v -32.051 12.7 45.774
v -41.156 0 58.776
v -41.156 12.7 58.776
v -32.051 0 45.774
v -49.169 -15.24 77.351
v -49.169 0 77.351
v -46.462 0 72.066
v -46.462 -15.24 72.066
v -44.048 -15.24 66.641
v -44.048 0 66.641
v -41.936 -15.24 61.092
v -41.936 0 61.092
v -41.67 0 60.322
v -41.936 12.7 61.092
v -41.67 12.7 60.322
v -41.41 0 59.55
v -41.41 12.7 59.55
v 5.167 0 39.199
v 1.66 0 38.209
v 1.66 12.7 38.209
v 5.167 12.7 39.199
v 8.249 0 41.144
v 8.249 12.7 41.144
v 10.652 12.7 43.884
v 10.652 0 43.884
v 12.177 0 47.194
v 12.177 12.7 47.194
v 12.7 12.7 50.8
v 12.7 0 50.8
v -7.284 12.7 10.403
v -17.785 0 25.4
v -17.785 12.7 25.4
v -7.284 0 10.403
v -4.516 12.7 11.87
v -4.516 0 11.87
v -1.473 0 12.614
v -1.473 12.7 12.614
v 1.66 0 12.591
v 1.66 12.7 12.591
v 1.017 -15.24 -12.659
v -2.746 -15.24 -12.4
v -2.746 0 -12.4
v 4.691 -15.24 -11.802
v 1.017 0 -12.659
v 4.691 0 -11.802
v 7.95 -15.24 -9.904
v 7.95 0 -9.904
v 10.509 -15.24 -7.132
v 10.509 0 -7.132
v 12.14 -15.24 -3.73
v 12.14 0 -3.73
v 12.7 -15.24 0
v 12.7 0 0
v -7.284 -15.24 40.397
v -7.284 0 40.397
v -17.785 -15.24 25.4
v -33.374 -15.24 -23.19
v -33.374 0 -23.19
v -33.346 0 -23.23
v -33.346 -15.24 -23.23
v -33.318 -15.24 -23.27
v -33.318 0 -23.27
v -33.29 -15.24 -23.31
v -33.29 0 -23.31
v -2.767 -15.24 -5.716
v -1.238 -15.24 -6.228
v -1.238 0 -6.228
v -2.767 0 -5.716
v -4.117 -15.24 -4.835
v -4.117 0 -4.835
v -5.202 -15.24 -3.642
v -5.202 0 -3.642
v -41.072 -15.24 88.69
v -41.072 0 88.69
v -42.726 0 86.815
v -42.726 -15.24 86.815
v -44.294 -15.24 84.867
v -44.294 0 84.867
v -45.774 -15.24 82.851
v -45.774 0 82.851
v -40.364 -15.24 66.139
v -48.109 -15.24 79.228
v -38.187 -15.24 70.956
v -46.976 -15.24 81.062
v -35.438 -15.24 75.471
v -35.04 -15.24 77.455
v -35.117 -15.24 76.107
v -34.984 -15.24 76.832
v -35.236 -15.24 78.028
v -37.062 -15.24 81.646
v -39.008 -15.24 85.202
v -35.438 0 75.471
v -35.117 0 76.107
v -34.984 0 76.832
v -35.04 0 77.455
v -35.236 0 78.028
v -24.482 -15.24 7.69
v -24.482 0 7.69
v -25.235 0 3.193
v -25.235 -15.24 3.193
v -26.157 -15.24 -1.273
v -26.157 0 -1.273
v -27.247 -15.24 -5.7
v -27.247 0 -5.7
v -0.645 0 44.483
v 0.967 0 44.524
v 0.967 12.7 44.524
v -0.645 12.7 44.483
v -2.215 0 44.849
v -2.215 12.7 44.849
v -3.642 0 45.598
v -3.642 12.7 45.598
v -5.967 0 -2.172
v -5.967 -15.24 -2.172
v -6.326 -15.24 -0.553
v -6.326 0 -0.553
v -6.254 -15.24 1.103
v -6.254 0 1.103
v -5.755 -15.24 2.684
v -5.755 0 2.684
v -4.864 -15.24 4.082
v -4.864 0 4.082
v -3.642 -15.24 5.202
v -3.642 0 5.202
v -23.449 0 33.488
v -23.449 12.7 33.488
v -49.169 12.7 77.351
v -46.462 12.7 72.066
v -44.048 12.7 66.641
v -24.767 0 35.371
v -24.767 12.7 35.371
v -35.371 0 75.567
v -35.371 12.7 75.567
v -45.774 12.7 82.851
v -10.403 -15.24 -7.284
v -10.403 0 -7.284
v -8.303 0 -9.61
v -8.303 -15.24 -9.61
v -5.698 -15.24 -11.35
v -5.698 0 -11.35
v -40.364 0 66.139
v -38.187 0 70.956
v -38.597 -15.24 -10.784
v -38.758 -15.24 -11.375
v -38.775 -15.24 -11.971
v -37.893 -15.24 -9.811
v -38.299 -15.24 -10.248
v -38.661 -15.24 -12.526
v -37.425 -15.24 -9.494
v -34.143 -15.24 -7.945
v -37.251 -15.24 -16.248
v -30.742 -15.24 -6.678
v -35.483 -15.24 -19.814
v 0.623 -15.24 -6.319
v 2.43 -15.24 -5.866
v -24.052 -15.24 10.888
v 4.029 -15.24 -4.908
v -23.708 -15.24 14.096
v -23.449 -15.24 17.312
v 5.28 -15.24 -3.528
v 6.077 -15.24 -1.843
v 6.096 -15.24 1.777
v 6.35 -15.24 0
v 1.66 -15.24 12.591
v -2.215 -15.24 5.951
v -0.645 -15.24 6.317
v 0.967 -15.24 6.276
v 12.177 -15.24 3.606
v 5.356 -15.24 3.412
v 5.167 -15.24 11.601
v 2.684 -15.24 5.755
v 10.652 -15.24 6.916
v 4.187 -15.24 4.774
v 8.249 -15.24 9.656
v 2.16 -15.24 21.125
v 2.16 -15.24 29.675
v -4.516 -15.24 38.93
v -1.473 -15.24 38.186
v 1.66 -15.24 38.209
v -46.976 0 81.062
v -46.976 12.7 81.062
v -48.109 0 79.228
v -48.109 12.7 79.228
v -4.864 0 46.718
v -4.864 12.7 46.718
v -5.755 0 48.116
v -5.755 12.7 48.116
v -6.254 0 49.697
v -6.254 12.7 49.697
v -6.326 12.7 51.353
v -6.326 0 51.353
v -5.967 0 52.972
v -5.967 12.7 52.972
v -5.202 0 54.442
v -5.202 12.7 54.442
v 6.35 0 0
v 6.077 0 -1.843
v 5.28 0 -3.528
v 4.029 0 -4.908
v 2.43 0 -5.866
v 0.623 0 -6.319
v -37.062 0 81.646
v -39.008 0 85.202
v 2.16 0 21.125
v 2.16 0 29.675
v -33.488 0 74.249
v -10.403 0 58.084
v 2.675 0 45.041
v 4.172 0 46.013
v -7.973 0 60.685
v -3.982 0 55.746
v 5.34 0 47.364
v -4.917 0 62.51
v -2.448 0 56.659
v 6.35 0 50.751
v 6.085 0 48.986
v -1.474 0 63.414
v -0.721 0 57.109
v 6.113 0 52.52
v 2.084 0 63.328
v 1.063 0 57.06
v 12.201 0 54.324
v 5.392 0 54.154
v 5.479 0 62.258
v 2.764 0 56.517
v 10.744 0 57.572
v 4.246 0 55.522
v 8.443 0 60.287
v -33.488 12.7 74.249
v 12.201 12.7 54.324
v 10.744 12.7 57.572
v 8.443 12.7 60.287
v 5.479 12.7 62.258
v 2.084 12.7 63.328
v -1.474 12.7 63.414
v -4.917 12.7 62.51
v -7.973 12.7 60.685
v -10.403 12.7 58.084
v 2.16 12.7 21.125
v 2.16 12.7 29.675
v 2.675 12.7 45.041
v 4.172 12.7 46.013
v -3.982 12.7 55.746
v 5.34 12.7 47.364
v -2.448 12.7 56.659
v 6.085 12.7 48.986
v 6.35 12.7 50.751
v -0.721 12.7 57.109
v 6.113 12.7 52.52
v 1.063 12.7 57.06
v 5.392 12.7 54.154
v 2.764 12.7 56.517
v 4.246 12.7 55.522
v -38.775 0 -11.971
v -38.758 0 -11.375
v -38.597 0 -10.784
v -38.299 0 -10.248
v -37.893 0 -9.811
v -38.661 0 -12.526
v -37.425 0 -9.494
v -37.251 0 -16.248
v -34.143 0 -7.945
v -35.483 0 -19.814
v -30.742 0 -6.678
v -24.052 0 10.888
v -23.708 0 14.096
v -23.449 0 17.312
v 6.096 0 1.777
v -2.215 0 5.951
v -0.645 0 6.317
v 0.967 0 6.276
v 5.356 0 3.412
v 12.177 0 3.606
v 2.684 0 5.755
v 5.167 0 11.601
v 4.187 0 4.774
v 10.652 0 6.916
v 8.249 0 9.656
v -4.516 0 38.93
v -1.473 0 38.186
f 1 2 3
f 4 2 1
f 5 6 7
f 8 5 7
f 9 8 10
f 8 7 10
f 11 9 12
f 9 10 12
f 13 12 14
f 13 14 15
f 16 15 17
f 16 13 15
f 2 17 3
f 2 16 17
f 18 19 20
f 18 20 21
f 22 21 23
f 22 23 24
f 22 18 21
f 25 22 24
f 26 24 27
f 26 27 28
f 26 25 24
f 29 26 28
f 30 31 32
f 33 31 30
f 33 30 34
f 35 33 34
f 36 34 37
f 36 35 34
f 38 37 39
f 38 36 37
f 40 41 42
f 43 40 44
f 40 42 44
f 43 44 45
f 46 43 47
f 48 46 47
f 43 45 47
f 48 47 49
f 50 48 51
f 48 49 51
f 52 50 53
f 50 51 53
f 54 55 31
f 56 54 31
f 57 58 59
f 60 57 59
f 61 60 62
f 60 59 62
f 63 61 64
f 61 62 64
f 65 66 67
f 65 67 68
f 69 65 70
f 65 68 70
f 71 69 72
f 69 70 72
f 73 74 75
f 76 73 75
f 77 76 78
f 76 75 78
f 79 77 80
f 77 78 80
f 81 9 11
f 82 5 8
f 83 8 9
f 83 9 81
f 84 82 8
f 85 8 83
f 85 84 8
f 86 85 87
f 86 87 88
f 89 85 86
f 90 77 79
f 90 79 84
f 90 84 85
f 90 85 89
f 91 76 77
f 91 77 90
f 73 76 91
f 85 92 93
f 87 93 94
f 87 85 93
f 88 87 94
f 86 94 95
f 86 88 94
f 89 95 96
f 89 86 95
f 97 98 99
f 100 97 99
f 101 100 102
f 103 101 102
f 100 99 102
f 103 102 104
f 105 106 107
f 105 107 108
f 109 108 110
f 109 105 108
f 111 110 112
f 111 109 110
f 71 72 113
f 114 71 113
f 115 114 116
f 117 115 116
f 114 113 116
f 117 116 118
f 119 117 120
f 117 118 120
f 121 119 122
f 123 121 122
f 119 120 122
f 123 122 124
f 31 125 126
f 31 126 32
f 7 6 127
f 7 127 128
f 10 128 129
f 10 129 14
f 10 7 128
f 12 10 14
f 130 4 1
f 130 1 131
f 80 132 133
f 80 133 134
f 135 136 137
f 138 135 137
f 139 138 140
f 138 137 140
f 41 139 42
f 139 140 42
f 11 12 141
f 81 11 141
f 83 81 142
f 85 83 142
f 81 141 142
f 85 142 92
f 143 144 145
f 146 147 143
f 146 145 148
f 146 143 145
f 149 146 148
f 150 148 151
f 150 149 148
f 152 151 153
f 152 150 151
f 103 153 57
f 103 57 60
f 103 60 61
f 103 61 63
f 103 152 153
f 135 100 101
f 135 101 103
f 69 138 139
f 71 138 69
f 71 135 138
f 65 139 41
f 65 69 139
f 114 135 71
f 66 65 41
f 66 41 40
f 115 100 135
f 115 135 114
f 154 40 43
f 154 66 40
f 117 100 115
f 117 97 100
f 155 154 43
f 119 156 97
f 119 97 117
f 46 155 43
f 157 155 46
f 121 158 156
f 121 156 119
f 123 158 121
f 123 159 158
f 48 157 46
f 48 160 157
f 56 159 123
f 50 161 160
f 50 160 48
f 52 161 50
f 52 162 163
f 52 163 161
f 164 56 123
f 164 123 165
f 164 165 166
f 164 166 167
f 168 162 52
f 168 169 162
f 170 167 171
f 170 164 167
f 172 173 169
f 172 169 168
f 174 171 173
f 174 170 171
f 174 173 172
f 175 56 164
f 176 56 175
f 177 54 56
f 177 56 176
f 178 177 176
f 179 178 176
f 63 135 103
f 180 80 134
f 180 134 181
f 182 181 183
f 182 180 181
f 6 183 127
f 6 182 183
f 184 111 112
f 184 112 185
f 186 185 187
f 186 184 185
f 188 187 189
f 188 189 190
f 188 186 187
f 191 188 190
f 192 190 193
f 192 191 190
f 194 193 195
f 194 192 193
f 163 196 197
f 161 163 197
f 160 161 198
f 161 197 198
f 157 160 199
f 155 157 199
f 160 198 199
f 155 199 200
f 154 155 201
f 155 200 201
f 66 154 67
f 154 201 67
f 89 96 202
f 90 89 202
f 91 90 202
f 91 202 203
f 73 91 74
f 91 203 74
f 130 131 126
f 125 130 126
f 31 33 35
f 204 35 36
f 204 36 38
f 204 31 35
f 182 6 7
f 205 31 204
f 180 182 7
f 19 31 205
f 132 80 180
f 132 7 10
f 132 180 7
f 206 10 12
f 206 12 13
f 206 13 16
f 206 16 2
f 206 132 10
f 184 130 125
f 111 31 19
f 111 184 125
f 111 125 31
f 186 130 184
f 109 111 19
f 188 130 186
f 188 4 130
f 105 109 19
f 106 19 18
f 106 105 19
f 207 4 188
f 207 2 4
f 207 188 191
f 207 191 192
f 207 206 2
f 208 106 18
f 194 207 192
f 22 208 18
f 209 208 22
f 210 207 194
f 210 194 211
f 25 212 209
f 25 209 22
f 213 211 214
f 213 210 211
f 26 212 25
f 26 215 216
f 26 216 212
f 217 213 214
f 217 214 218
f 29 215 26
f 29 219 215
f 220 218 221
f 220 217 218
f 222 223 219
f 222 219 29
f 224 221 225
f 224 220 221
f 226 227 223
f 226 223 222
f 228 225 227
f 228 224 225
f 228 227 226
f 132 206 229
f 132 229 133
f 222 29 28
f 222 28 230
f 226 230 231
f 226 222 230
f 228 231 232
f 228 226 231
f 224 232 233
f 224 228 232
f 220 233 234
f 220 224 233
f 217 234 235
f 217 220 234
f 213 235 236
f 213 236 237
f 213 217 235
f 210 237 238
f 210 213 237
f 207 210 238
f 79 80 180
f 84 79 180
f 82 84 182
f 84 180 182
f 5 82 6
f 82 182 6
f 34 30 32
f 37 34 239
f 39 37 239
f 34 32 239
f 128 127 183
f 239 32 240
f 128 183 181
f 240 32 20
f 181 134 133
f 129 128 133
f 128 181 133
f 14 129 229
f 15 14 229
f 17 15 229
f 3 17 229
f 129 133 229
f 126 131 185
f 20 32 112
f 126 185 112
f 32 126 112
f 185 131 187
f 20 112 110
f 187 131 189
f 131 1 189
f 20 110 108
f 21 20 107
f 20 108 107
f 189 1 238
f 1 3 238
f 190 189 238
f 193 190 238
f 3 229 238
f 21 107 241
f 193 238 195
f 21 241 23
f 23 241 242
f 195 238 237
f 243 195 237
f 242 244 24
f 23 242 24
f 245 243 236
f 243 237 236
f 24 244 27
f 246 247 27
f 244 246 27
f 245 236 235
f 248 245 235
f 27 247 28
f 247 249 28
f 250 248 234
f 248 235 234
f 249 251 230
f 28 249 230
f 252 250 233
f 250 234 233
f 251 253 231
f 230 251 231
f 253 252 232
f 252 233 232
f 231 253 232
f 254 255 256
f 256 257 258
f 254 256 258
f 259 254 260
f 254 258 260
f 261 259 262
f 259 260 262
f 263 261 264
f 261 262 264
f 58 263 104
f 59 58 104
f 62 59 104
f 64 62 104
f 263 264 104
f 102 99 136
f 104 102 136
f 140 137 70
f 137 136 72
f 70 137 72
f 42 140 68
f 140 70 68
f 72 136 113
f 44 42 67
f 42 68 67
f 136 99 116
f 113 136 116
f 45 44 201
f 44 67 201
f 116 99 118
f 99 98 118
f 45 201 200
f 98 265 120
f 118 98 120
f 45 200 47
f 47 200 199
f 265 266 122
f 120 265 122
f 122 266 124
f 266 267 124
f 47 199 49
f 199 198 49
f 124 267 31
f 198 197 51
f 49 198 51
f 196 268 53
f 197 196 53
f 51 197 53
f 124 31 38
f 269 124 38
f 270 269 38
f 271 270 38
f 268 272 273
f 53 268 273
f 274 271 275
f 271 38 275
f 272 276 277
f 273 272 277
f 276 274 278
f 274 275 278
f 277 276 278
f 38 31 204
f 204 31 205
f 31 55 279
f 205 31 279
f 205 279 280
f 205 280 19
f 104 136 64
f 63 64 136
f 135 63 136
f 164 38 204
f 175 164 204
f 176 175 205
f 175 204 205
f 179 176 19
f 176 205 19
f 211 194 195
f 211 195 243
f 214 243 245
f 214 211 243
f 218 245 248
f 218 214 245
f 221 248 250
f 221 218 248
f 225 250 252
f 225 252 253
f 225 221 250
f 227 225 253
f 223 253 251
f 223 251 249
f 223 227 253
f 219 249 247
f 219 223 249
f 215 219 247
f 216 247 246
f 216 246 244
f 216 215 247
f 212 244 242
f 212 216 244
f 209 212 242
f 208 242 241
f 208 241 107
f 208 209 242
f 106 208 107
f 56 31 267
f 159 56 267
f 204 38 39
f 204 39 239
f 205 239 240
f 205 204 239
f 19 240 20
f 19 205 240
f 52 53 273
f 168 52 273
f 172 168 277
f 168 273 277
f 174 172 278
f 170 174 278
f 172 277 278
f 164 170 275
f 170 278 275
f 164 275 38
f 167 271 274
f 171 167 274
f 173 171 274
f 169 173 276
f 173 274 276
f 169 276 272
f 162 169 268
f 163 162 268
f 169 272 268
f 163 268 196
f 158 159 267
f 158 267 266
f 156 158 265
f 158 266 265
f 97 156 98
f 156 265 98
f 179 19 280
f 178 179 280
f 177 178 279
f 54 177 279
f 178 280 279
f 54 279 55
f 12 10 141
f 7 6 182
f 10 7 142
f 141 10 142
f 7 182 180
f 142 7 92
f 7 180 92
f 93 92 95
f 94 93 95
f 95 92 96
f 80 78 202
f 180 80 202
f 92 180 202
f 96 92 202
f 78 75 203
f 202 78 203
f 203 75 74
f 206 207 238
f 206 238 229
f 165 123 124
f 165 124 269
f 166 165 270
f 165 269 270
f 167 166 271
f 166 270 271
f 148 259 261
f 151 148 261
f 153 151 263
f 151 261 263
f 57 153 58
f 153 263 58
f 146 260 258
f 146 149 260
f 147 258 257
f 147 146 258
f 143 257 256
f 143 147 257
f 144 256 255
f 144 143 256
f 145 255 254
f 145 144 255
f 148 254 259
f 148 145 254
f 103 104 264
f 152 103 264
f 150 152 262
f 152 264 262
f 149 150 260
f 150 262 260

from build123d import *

# Parameters (mm, degrees)
F1_DEPTH = 15.24
F2_DEPTH = 12.7
F3_R     = 2.54
F3_2_R   = 2.54


with BuildPart() as f1:
    # F0 (on Front) → F1 (new body)
    with BuildSketch(Plane.XZ):
        with BuildLine():
            ThreePointArc((-10.4032309625, -7.2844207417), (-12.5070584633, 2.2053318564), (-7.2844207417, 10.4032309625))
            Line((-7.2844207417, 10.4032309625), (-17.7852714705, 25.4))
            Line((-17.7852714705, 25.4), (-23.4487037639, 17.311780459))
            ThreePointArc((-23.4487037639, 17.3117804589), (-23.8691571207, 12.4904135074), (-24.4822790895, 7.6897425378))
            ThreePointArc((-24.4822790895, 7.6897425378), (-25.6753043407, 0.9556578611), (-27.247280138, -5.700174001))
            ThreePointArc((-27.247280138, -5.700174001), (-29.9750764217, -14.5626206105), (-33.3742275986, -23.1898799521))
            ThreePointArc((-33.3742275986, -23.1898799521), (-33.332337581, -23.2500509975), (-33.2903390799, -23.3101463733))
            Line((-33.2903390799, -23.3101463733), (-10.4032309625, -7.2844207417))
        make_face()
        with BuildLine():
            ThreePointArc((-5.2016154812, -3.6422103708), (-6.2535292316, 1.1026659282), (-3.6422103708, 5.2016154812))
            Line((-3.6422103708, 5.2016154812), (-7.2844207417, 10.4032309625))
            ThreePointArc((-7.2844207417, 10.4032309625), (-12.5070584633, 2.2053318564), (-10.4032309625, -7.2844207417))
            Line((-10.4032309625, -7.2844207417), (-5.2016154812, -3.6422103708))
        make_face()
        with BuildLine():
            ThreePointArc((-2.7462097635, -12.3995295046), (-1.958668649, -9.3220137901), (-1.2381453807, -6.2281213874))
            ThreePointArc((-1.2381453807, -6.2281213874), (-3.4697786581, -5.3181891715), (-5.2016154812, -3.6422103708))
            Line((-5.2016154812, -3.6422103708), (-10.4032309625, -7.2844207417))
            ThreePointArc((-10.4032309625, -7.2844207417), (-7.0546461474, -10.5603961921), (-2.7462097635, -12.3995295046))
        make_face()
        with BuildLine():
            ThreePointArc((0.9666668919, 6.2759903697), (4.8197943298, 4.1342572027), (6.35, 0))
            ThreePointArc((6.35, 0), (4.0286645947, -4.9083970483), (-1.2381453807, -6.2281213874))
            ThreePointArc((-1.2381453807, -6.2281213874), (-1.958668649, -9.3220137901), (-2.7462097635, -12.3995295046))
            ThreePointArc((-2.7462097635, -12.3995295046), (7.9502558451, -9.9037079924), (12.7, 0))
            ThreePointArc((12.7, 0), (9.5492344397, 8.372700975), (1.6602958084, 12.5910054336))
            ThreePointArc((1.6602958084, 12.5910054336), (1.3477700165, 9.4297317015), (0.9666668919, 6.2759903697))
        make_face()
        with BuildLine():
            ThreePointArc((-3.6422103708, 5.2016154812), (-1.4415975781, 6.1841973144), (0.9666668919, 6.2759903697))
            ThreePointArc((0.9666668919, 6.2759903697), (1.3477700165, 9.4297317015), (1.6602958084, 12.5910054336))
            ThreePointArc((1.6602958084, 12.5910054336), (-3.0173307078, 12.3363574608), (-7.2844207417, 10.4032309625))
            Line((-7.2844207417, 10.4032309625), (-3.6422103708, 5.2016154812))
        make_face()
        with BuildLine():
            ThreePointArc((-7.2844207417, 10.4032309625), (-3.0173307078, 12.3363574608), (1.6602958084, 12.5910054336))
            ThreePointArc((1.6602958084, 12.5910054336), (2.2222120536, 25.4), (1.6602958084, 38.2089945664))
            ThreePointArc((1.6602958084, 38.2089945664), (-3.0173307078, 38.4636425392), (-7.2844207417, 40.3967690375))
            Line((-7.2844207417, 40.3967690375), (-17.7852714705, 25.4))
            Line((-17.7852714705, 25.4), (-7.2844207417, 10.4032309625))
        make_face()
        with BuildLine():
            ThreePointArc((-39.2570089364, -10.5117481595), (-36.8647241491, -17.1056047368), (-33.3742275986, -23.1898799521))
            ThreePointArc((-33.3742275986, -23.1898799521), (-29.9750764217, -14.5626206105), (-27.247280138, -5.700174001))
            ThreePointArc((-27.247280138, -5.700174001), (-33.4333745622, -7.6536094425), (-39.2570089364, -10.5117481595))
        make_face()
    extrude(amount=F1_DEPTH)

    # F3
    f3_edges = [f1.edges().sort_by_distance(p)[0] for p in [
        (-39.257009, -7.62, -10.511748),
    ]]
    fillet(f3_edges, radius=F3_R)


with BuildPart() as f1b:
    # F0 (on Front) → F1, piece 2 (new body)
    with BuildSketch(Plane.XZ):
        with BuildLine():
            ThreePointArc((-41.935619441, 61.0915607223), (-39.3250885511, 68.6339510609), (-35.3709852724, 75.5670305216))
            Line((-35.3709852724, 75.5670305216), (-45.7742162349, 82.8514512633))
            ThreePointArc((-45.7742162349, 82.8514512633), (-47.5513705802, 80.150324631), (-49.1693231871, 77.3509332664))
            ThreePointArc((-49.1693231871, 77.3509332664), (-45.2175428708, 69.3702547822), (-41.935619441, 61.0915607223))
        make_face()
        with BuildLine():
            Line((-45.7742162349, 82.8514512633), (-35.3709852724, 75.5670305216))
            ThreePointArc((-35.3709852724, 75.5670305216), (-34.9813519115, 76.1143717766), (-34.5832495999, 76.6555844473))
            ThreePointArc((-34.5832495999, 76.6555844473), (-37.6573325287, 82.7646940248), (-41.0720083574, 88.6901640204))
            ThreePointArc((-41.0720083574, 88.6901640204), (-43.5211365103, 85.8497514521), (-45.7742162349, 82.8514512633))
        make_face()
    extrude(amount=F1_DEPTH)

    # F3#2
    f3_2_edges = [f1b.edges().sort_by_distance(p)[0] for p in [
        (-34.58325, -7.62, 76.655584),
    ]]
    fillet(f3_2_edges, radius=F3_2_R)


with BuildPart() as f2:
    # F0 (on Front) → F2 (new body)
    with BuildSketch(Plane.XZ):
        with BuildLine():
            ThreePointArc((-41.935619441, 61.0915607223), (-39.3250885511, 68.6339510609), (-35.3709852724, 75.5670305216))
            Line((-35.3709852724, 75.5670305216), (-45.7742162349, 82.8514512633))
            ThreePointArc((-45.7742162349, 82.8514512633), (-47.5513705802, 80.150324631), (-49.1693231871, 77.3509332664))
            ThreePointArc((-49.1693231871, 77.3509332664), (-45.2175428708, 69.3702547822), (-41.935619441, 61.0915607223))
        make_face()
        with BuildLine():
            ThreePointArc((-25.6358638454, 49.6525617154), (-28.9034220532, 62.1608980598), (-33.488219541, 74.2487037639))
            Line((-33.488219541, 74.2487037639), (-35.3709852724, 75.5670305216))
            ThreePointArc((-35.3709852724, 75.5670305216), (-39.3250885511, 68.6339510609), (-41.935619441, 61.0915607223))
            ThreePointArc((-41.935619441, 61.0915607223), (-41.5390767729, 59.9361318066), (-41.1556072988, 58.7762985301))
            Line((-41.1556072988, 58.7762985301), (-32.0514512633, 45.7742162349))
            ThreePointArc((-32.0514512633, 45.7742162349), (-28.9087698117, 47.8210981469), (-25.6358638454, 49.6525617154))
        make_face()
        with BuildLine():
            Line((-23.4487037639, 33.488219541), (-17.7852714705, 25.4))
            Line((-17.7852714705, 25.4), (-7.2844207417, 40.3967690375))
            ThreePointArc((-7.2844207417, 40.3967690375), (-12.5070584633, 48.5946681436), (-10.4032309625, 58.0844207417))
            Line((-10.4032309625, 58.0844207417), (-33.488219541, 74.2487037639))
            ThreePointArc((-33.488219541, 74.2487037639), (-28.9034220532, 62.1608980598), (-25.6358638454, 49.6525617154))
            ThreePointArc((-25.6358638454, 49.6525617154), (-24.453748264, 42.9165533695), (-23.6544937534, 36.1244698961))
            ThreePointArc((-23.6544937534, 36.1244698961), (-23.5443895594, 34.8069074804), (-23.4487037639, 33.4882195411))
        make_face()
        with BuildLine():
            ThreePointArc((-7.2844207417, 10.4032309625), (-3.0173307078, 12.3363574608), (1.6602958084, 12.5910054336))
            ThreePointArc((1.6602958084, 12.5910054336), (2.2222120536, 25.4), (1.6602958084, 38.2089945664))
            ThreePointArc((1.6602958084, 38.2089945664), (-3.0173307078, 38.4636425392), (-7.2844207417, 40.3967690375))
            Line((-7.2844207417, 40.3967690375), (-17.7852714705, 25.4))
            Line((-17.7852714705, 25.4), (-7.2844207417, 10.4032309625))
        make_face()
        with BuildLine():
            ThreePointArc((-10.4032309625, 58.0844207417), (-12.5070584633, 48.5946681436), (-7.2844207417, 40.3967690375))
            Line((-7.2844207417, 40.3967690375), (-3.6422103708, 45.5983845188))
            ThreePointArc((-3.6422103708, 45.5983845188), (-6.2535292316, 49.6973340718), (-5.2016154812, 54.4422103708))
            Line((-5.2016154812, 54.4422103708), (-10.4032309625, 58.0844207417))
        make_face()
        with BuildLine():
            ThreePointArc((0.9666668919, 44.5240096303), (1.3477700165, 41.3702682985), (1.6602958084, 38.2089945664))
            ThreePointArc((1.6602958084, 38.2089945664), (9.5492344397, 42.427299025), (12.7, 50.8))
            ThreePointArc((12.7, 50.8), (3.8189636537, 62.9122052745), (-10.4032309625, 58.0844207417))
            Line((-10.4032309625, 58.0844207417), (-5.2016154812, 54.4422103708))
            ThreePointArc((-5.2016154812, 54.4422103708), (1.9094818269, 56.8561026373), (6.35, 50.8))
            ThreePointArc((6.35, 50.8), (4.8197943298, 46.6657427973), (0.9666668919, 44.5240096303))
        make_face()
        with BuildLine():
            ThreePointArc((-7.2844207417, 40.3967690375), (-3.0173307078, 38.4636425392), (1.6602958084, 38.2089945664))
            ThreePointArc((1.6602958084, 38.2089945664), (1.3477700165, 41.3702682985), (0.9666668919, 44.5240096303))
            ThreePointArc((0.9666668919, 44.5240096303), (-1.4415975781, 44.6158026856), (-3.6422103708, 45.5983845188))
            Line((-3.6422103708, 45.5983845188), (-7.2844207417, 40.3967690375))
        make_face()
        with BuildLine():
            Line((-32.0514512633, 45.7742162349), (-24.7670305216, 35.3709852724))
            ThreePointArc((-24.7670305216, 35.3709852724), (-24.2136931931, 35.7520553528), (-23.6544937534, 36.1244698961))
            ThreePointArc((-23.6544937534, 36.1244698961), (-24.453748264, 42.9165533695), (-25.6358638454, 49.6525617154))
            ThreePointArc((-25.6358638454, 49.6525617154), (-28.9087698117, 47.8210981469), (-32.0514512633, 45.7742162349))
        make_face()
        with BuildLine():
            Line((-24.7670305216, 35.3709852724), (-23.4487037639, 33.488219541))
            ThreePointArc((-23.4487037639, 33.4882195411), (-23.5443895594, 34.8069074804), (-23.6544937534, 36.1244698961))
            ThreePointArc((-23.6544937534, 36.1244698961), (-24.2136931931, 35.7520553528), (-24.7670305216, 35.3709852724))
        make_face()
    extrude(amount=-F2_DEPTH)


solid = Compound([f1.part, f1b.part, f2.part])
